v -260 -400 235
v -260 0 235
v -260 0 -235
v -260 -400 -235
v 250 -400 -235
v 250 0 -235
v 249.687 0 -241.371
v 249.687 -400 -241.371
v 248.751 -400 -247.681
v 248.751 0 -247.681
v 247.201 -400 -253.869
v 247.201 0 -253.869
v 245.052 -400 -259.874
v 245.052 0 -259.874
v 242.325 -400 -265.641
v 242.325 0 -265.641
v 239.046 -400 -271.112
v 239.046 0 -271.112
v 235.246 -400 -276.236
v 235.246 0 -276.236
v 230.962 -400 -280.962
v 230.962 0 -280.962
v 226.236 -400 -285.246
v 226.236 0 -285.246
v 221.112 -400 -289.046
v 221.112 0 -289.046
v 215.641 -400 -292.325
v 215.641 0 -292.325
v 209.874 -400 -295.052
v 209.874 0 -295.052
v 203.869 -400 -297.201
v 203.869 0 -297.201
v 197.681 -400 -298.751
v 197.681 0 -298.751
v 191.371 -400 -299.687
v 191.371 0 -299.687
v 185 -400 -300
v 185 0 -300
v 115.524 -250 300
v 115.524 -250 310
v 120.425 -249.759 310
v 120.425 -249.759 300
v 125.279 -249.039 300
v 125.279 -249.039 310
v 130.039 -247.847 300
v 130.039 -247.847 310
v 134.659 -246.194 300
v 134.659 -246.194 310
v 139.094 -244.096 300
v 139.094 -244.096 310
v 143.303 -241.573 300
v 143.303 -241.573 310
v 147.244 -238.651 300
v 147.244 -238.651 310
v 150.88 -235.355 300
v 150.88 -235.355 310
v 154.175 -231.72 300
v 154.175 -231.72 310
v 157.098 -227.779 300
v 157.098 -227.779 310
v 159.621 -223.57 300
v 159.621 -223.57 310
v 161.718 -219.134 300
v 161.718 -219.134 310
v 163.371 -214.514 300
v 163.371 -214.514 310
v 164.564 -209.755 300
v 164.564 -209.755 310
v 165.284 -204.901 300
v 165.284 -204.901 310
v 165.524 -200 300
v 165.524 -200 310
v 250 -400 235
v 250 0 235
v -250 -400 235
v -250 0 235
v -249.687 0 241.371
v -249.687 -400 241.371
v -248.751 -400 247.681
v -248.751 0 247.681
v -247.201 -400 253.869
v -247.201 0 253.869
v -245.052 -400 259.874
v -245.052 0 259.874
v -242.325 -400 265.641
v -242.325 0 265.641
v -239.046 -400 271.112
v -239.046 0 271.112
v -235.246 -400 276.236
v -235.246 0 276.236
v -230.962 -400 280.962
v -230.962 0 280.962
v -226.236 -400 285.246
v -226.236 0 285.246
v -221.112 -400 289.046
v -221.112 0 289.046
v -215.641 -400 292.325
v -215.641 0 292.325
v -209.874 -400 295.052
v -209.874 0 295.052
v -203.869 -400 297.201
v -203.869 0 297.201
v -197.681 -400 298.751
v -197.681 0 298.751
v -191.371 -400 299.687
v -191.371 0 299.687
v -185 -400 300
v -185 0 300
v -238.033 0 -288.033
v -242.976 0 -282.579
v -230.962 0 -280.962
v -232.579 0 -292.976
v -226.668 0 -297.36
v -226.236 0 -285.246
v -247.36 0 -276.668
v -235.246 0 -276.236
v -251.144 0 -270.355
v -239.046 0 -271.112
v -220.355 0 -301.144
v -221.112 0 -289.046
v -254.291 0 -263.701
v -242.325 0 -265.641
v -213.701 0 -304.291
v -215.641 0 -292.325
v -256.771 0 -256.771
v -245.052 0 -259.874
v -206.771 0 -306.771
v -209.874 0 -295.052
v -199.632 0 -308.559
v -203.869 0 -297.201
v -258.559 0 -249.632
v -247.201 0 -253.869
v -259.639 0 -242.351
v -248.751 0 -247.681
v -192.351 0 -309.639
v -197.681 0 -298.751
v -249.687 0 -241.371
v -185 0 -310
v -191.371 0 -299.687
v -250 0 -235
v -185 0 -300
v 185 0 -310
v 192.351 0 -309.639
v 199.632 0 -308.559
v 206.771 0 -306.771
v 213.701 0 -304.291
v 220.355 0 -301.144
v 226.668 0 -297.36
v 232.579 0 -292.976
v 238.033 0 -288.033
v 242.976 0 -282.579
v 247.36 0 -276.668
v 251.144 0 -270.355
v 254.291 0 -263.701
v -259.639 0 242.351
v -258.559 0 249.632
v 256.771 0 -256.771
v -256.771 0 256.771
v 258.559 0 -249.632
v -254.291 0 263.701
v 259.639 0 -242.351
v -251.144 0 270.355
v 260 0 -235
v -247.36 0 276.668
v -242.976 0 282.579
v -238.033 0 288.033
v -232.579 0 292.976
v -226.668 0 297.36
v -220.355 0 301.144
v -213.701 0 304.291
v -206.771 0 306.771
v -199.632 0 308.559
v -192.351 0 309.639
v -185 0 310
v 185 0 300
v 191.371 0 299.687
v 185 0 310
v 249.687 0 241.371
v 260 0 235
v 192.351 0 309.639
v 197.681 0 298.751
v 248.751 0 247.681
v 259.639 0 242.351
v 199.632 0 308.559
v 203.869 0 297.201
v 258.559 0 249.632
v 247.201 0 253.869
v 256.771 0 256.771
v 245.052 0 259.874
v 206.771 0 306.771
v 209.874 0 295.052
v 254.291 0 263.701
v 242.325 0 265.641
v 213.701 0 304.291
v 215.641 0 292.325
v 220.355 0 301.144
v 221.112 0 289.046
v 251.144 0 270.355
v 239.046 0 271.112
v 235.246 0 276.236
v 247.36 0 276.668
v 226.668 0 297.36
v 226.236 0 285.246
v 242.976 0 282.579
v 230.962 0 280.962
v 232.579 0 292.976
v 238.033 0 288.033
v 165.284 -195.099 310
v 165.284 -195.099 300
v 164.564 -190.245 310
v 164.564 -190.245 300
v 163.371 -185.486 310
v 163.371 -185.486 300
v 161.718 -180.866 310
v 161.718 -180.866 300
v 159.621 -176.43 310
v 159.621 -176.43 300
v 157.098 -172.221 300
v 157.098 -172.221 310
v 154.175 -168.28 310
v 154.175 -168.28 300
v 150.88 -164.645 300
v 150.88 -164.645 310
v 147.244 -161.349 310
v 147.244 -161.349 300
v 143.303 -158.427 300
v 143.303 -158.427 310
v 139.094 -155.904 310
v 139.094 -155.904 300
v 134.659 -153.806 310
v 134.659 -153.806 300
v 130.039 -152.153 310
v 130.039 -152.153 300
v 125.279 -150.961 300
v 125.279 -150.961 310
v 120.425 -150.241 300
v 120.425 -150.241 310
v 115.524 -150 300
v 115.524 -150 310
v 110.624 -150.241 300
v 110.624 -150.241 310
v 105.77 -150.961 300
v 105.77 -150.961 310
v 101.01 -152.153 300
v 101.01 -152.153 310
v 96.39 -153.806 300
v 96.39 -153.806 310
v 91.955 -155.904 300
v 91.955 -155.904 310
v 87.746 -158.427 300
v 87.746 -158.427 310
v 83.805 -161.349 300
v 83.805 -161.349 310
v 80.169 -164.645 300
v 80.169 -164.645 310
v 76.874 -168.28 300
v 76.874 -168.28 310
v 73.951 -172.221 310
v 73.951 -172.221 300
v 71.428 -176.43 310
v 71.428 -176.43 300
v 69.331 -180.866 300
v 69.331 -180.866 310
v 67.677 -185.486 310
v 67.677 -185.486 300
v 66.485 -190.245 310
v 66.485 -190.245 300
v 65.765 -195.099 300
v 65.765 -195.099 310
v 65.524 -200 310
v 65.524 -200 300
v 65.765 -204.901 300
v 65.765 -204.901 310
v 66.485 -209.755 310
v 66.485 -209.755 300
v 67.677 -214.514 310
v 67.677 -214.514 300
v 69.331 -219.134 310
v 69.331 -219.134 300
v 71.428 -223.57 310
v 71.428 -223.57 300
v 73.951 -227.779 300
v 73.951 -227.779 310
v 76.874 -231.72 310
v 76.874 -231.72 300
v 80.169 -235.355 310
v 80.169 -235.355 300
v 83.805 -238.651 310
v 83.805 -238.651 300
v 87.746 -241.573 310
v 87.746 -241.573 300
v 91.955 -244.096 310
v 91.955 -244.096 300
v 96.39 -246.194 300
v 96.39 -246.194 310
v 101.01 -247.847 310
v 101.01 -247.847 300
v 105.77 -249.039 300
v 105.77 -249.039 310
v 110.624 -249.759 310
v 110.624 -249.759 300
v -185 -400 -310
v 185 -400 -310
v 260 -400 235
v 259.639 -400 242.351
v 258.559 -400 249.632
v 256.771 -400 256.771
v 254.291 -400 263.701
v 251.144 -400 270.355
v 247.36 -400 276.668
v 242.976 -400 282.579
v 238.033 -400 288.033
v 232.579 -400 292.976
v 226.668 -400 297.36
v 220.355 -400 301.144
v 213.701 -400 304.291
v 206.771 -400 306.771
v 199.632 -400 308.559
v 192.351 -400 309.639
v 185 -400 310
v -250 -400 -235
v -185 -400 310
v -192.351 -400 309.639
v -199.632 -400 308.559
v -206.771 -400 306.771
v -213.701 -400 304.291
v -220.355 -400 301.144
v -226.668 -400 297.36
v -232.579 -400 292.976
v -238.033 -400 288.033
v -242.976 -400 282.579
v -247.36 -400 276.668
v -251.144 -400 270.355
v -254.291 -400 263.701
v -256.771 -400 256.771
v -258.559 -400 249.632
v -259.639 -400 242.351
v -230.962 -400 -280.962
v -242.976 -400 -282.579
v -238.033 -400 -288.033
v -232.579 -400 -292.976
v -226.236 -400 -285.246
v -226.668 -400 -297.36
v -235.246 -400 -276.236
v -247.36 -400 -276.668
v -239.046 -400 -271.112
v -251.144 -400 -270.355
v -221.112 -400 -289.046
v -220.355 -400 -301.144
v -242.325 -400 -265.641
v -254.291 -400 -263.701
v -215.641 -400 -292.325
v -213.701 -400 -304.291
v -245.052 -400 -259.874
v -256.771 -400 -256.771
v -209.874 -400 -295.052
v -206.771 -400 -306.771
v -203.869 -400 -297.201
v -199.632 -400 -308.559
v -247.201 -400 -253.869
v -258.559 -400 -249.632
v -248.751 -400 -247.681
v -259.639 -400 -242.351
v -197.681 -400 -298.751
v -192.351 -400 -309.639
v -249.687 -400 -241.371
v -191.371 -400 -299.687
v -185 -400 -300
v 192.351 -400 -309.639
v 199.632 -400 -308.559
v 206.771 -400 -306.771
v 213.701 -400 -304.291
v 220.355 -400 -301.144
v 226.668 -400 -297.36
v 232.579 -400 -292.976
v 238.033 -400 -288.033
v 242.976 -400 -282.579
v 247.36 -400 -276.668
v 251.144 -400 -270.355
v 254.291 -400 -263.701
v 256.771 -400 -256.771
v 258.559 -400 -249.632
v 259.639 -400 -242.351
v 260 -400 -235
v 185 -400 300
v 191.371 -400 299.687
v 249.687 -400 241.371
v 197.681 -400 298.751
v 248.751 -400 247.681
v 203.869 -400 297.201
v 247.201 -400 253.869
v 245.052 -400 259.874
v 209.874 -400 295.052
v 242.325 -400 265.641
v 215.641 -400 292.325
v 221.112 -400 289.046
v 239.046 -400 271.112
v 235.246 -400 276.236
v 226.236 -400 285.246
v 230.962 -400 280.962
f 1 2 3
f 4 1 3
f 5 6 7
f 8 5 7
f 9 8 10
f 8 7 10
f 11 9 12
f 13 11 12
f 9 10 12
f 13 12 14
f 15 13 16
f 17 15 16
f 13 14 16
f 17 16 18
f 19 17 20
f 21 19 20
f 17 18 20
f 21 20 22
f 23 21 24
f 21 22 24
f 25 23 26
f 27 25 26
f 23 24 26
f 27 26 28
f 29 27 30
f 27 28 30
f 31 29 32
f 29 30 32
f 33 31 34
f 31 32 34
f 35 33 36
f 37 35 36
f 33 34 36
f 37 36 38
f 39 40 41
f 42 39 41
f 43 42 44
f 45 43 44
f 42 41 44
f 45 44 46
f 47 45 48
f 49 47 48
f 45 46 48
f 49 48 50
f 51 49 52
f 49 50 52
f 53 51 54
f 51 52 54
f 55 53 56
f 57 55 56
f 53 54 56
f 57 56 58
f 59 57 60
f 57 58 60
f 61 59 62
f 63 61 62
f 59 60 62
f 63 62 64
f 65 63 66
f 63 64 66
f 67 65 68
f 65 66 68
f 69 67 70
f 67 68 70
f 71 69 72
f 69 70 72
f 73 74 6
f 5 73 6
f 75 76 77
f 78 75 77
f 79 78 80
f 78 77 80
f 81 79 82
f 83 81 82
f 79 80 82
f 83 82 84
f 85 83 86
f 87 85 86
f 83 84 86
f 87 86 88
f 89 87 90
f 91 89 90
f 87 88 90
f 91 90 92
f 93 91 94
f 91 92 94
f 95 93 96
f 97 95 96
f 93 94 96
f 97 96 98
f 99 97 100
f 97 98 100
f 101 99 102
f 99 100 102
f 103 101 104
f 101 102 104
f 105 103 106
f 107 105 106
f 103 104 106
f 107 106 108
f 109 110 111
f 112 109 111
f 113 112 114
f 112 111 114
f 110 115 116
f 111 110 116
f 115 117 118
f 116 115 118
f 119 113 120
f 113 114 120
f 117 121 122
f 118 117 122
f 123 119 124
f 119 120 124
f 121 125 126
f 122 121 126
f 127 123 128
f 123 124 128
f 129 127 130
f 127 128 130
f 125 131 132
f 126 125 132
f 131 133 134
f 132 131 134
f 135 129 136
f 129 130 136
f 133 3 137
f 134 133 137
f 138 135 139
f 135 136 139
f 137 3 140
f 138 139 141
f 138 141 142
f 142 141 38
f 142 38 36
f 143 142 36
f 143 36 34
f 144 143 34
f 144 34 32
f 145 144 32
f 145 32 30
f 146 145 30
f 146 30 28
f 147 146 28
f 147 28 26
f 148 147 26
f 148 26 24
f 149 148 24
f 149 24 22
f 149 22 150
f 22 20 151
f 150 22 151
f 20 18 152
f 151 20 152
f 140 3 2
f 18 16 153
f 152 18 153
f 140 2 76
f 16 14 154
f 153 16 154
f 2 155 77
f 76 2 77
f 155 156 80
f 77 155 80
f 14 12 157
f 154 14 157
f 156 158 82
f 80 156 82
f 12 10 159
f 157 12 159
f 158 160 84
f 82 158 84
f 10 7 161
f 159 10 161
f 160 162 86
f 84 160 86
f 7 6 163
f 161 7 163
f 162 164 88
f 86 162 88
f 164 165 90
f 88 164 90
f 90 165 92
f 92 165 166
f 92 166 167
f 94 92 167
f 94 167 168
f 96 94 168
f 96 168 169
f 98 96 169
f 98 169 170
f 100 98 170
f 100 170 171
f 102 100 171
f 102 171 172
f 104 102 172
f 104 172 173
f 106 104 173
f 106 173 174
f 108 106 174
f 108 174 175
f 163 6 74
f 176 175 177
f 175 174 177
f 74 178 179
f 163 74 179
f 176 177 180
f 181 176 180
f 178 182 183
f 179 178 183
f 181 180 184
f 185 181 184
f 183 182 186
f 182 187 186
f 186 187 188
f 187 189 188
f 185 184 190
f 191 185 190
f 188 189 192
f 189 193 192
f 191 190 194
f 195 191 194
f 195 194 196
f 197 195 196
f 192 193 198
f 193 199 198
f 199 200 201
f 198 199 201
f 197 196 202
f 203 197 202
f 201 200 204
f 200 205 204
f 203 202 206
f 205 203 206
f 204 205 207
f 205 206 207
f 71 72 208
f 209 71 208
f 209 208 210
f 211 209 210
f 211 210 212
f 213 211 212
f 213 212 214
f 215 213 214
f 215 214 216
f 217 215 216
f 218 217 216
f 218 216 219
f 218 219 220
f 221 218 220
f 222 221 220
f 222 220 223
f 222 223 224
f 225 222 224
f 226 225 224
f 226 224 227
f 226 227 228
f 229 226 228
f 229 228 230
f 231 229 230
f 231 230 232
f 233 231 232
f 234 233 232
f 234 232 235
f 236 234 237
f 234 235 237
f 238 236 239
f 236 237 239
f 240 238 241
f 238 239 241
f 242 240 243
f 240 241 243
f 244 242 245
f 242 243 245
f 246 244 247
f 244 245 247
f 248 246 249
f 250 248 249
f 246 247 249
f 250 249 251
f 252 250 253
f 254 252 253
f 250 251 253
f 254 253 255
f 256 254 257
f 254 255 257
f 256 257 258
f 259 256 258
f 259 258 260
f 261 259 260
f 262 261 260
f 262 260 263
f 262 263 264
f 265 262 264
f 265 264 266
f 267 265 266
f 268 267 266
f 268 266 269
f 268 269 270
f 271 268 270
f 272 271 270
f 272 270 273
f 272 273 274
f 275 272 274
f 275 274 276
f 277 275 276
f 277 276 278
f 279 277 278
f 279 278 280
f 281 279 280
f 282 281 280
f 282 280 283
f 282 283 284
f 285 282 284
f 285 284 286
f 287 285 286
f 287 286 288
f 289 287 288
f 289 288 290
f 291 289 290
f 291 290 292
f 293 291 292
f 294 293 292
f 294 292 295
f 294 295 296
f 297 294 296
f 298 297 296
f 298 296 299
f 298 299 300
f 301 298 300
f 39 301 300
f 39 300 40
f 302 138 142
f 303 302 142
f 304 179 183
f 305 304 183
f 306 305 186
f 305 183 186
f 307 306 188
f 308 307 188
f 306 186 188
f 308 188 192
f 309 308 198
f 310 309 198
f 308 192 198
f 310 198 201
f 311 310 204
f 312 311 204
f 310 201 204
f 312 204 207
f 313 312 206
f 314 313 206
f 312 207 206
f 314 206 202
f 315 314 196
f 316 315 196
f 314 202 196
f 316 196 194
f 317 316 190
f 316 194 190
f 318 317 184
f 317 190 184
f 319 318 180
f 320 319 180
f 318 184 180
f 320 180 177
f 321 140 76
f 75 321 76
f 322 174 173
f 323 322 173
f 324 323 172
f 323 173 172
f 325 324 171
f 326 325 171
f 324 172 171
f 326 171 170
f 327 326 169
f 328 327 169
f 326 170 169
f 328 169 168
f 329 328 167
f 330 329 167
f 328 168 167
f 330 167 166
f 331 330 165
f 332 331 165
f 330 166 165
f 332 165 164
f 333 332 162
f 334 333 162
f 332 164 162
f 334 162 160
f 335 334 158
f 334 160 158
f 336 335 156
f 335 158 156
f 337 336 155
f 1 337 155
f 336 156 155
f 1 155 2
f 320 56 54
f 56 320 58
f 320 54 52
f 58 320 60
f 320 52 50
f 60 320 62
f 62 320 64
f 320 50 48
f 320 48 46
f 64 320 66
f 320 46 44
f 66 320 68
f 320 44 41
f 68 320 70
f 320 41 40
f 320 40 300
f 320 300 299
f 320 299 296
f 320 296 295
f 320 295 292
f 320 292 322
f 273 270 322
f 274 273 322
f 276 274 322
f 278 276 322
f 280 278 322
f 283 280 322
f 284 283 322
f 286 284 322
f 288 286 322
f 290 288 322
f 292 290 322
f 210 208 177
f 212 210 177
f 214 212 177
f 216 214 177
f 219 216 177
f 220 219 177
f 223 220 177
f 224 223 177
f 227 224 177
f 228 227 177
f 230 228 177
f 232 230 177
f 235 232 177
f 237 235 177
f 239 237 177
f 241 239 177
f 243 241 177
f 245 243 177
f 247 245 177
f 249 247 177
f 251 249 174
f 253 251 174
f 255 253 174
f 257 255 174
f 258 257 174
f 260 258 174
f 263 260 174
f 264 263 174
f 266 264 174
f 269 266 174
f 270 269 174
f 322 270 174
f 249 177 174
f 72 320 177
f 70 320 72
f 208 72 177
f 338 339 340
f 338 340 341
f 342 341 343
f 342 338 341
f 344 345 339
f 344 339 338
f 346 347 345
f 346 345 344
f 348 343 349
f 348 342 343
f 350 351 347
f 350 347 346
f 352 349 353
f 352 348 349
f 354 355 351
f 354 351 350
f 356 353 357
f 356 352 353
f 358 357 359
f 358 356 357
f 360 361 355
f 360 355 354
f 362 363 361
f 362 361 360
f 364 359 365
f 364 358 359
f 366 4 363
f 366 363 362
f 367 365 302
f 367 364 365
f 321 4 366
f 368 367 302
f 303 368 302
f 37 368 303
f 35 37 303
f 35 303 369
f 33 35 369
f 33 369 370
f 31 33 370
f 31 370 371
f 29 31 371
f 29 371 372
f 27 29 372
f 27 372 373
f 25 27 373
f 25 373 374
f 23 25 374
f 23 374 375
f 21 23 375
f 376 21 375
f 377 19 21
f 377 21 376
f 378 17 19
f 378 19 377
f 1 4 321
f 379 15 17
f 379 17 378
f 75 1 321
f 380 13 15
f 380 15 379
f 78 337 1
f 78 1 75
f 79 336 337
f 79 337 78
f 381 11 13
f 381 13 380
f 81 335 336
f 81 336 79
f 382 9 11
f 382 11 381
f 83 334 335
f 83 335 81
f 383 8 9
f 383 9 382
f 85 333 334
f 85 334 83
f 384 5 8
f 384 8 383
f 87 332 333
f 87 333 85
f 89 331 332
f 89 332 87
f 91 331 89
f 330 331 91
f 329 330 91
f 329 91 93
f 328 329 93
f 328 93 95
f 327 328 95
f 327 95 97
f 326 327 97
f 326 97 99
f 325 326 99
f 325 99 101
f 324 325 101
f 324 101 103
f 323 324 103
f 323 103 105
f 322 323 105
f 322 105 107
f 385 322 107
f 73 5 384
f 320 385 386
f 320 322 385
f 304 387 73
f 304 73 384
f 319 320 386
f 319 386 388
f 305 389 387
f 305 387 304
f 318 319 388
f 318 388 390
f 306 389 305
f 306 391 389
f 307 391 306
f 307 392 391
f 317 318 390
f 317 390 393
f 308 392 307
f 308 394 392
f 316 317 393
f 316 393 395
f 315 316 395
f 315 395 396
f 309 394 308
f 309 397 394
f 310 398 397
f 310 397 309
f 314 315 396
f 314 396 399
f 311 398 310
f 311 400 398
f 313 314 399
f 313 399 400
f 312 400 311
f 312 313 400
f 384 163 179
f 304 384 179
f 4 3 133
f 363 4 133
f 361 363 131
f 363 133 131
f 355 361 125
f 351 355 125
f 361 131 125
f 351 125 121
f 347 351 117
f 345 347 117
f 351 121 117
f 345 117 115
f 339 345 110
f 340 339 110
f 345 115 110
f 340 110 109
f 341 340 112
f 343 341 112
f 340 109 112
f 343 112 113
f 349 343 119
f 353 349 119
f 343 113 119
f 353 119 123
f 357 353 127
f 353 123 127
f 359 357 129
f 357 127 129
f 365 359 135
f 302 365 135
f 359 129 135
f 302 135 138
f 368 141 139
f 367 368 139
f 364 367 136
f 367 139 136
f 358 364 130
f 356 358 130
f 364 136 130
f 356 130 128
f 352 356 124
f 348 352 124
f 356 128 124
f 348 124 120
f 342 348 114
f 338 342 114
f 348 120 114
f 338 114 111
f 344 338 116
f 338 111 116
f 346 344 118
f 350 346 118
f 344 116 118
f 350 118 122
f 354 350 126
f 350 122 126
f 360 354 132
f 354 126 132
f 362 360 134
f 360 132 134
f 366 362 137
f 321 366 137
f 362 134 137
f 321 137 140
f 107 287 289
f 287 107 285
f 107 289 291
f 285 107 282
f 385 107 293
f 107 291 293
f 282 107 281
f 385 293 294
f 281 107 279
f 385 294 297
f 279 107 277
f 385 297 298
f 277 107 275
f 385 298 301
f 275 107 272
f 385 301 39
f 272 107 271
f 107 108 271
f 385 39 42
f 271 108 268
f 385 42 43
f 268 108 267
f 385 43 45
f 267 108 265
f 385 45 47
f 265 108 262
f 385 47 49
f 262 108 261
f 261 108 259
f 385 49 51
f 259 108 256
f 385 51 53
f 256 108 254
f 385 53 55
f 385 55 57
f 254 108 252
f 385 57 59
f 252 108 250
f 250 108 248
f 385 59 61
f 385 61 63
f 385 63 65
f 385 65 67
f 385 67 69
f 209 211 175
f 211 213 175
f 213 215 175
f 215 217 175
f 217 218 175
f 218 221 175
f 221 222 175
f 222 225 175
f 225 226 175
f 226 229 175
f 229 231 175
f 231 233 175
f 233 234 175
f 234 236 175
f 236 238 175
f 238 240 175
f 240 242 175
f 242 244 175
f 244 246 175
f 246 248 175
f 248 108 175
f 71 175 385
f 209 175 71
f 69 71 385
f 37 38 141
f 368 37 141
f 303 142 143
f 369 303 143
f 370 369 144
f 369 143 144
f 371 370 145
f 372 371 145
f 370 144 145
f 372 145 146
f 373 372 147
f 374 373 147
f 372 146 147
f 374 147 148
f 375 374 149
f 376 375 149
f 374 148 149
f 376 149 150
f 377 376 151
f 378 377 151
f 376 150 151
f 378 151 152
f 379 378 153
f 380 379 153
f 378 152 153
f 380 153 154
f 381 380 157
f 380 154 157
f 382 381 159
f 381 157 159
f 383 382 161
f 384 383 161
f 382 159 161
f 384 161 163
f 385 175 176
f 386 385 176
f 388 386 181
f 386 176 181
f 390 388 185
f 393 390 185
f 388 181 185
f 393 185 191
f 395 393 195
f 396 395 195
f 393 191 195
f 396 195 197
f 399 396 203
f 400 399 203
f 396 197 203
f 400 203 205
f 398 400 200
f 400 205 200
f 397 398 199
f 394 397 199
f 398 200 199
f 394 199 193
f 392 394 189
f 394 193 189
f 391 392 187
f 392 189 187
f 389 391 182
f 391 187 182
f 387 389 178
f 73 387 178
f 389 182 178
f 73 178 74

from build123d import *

# Parameters (mm, degrees)
F1_DEPTH = 400
F3_DEPTH = 25


with BuildPart() as f1:
    # F0 (on Front) → F1 (new body)
    with BuildSketch(Plane.XZ):
        with BuildLine():
            Line((260, -235), (260, 235))
            ThreePointArc((260, 235), (238.033009, 288.033009), (185, 310))
            Line((185, 310), (-185, 310))
            ThreePointArc((-185, 310), (-238.033009, 288.033009), (-260, 235))
            Line((-260, 235), (-260, -235))
            ThreePointArc((-260, -235), (-238.033009, -288.033009), (-185, -310))
            Line((-185, -310), (185, -310))
            ThreePointArc((185, -310), (238.033009, -288.033009), (260, -235))
        make_face()
        with BuildLine():
            ThreePointArc((-250, 235), (-230.961941, 280.961941), (-185, 300))
            Line((-185, 300), (185, 300))
            ThreePointArc((185, 300), (230.961941, 280.961941), (250, 235))
            Line((250, 235), (250, -235))
            ThreePointArc((250, -235), (230.961941, -280.961941), (185, -300))
            Line((185, -300), (-185, -300))
            ThreePointArc((-185, -300), (-230.961941, -280.961941), (-250, -235))
            Line((-250, -235), (-250, 235))
        make_face(mode=Mode.SUBTRACT)
    extrude(amount=F1_DEPTH)

    # F2 (on face) → F3 (cut)
    with BuildSketch(Plane.XY.offset(310)):
        with BuildLine():
            ThreePointArc((165.524478, -200), (80.169139, -164.644661), (115.524478, -250))
            ThreePointArc((115.524478, -250), (150.879817, -235.355339), (165.524478, -200))
        make_face()
    extrude(amount=-F3_DEPTH, mode=Mode.SUBTRACT)


solid = f1.part
